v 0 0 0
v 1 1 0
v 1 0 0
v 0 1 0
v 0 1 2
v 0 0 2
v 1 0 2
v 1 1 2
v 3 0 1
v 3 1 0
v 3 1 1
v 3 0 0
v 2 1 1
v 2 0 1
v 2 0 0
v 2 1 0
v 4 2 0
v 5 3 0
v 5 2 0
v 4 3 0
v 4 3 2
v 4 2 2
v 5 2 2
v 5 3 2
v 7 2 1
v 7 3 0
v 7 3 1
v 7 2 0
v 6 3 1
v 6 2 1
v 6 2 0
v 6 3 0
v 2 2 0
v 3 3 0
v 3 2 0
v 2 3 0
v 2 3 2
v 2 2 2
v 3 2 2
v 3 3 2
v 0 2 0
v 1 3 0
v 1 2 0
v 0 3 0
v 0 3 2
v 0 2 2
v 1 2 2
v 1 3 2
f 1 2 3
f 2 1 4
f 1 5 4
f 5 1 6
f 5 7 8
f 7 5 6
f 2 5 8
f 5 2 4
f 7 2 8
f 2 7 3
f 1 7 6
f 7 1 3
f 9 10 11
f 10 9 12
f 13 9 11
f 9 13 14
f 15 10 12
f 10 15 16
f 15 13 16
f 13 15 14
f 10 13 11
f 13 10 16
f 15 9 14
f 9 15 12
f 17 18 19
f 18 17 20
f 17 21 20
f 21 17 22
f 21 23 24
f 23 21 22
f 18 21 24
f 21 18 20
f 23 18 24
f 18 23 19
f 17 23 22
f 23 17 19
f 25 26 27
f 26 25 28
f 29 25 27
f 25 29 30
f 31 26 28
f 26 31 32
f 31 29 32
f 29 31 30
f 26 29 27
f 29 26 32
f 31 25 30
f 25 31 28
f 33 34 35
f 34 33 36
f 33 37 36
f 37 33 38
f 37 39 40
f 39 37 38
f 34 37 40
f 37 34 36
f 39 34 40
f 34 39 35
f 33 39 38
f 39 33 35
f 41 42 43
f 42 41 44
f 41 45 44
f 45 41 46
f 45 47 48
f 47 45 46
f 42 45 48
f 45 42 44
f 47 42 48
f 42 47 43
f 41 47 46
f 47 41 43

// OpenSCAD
shiftX(2) cube();
translate([0,2,0])  shiftX(2){
   shiftX(2){
    shiftX(2) cube();;
   }
}
//place cube and move by dist
module shiftX(dist){
  linear_extrude(2) square();
  translate([dist,0,0]) children();
}
